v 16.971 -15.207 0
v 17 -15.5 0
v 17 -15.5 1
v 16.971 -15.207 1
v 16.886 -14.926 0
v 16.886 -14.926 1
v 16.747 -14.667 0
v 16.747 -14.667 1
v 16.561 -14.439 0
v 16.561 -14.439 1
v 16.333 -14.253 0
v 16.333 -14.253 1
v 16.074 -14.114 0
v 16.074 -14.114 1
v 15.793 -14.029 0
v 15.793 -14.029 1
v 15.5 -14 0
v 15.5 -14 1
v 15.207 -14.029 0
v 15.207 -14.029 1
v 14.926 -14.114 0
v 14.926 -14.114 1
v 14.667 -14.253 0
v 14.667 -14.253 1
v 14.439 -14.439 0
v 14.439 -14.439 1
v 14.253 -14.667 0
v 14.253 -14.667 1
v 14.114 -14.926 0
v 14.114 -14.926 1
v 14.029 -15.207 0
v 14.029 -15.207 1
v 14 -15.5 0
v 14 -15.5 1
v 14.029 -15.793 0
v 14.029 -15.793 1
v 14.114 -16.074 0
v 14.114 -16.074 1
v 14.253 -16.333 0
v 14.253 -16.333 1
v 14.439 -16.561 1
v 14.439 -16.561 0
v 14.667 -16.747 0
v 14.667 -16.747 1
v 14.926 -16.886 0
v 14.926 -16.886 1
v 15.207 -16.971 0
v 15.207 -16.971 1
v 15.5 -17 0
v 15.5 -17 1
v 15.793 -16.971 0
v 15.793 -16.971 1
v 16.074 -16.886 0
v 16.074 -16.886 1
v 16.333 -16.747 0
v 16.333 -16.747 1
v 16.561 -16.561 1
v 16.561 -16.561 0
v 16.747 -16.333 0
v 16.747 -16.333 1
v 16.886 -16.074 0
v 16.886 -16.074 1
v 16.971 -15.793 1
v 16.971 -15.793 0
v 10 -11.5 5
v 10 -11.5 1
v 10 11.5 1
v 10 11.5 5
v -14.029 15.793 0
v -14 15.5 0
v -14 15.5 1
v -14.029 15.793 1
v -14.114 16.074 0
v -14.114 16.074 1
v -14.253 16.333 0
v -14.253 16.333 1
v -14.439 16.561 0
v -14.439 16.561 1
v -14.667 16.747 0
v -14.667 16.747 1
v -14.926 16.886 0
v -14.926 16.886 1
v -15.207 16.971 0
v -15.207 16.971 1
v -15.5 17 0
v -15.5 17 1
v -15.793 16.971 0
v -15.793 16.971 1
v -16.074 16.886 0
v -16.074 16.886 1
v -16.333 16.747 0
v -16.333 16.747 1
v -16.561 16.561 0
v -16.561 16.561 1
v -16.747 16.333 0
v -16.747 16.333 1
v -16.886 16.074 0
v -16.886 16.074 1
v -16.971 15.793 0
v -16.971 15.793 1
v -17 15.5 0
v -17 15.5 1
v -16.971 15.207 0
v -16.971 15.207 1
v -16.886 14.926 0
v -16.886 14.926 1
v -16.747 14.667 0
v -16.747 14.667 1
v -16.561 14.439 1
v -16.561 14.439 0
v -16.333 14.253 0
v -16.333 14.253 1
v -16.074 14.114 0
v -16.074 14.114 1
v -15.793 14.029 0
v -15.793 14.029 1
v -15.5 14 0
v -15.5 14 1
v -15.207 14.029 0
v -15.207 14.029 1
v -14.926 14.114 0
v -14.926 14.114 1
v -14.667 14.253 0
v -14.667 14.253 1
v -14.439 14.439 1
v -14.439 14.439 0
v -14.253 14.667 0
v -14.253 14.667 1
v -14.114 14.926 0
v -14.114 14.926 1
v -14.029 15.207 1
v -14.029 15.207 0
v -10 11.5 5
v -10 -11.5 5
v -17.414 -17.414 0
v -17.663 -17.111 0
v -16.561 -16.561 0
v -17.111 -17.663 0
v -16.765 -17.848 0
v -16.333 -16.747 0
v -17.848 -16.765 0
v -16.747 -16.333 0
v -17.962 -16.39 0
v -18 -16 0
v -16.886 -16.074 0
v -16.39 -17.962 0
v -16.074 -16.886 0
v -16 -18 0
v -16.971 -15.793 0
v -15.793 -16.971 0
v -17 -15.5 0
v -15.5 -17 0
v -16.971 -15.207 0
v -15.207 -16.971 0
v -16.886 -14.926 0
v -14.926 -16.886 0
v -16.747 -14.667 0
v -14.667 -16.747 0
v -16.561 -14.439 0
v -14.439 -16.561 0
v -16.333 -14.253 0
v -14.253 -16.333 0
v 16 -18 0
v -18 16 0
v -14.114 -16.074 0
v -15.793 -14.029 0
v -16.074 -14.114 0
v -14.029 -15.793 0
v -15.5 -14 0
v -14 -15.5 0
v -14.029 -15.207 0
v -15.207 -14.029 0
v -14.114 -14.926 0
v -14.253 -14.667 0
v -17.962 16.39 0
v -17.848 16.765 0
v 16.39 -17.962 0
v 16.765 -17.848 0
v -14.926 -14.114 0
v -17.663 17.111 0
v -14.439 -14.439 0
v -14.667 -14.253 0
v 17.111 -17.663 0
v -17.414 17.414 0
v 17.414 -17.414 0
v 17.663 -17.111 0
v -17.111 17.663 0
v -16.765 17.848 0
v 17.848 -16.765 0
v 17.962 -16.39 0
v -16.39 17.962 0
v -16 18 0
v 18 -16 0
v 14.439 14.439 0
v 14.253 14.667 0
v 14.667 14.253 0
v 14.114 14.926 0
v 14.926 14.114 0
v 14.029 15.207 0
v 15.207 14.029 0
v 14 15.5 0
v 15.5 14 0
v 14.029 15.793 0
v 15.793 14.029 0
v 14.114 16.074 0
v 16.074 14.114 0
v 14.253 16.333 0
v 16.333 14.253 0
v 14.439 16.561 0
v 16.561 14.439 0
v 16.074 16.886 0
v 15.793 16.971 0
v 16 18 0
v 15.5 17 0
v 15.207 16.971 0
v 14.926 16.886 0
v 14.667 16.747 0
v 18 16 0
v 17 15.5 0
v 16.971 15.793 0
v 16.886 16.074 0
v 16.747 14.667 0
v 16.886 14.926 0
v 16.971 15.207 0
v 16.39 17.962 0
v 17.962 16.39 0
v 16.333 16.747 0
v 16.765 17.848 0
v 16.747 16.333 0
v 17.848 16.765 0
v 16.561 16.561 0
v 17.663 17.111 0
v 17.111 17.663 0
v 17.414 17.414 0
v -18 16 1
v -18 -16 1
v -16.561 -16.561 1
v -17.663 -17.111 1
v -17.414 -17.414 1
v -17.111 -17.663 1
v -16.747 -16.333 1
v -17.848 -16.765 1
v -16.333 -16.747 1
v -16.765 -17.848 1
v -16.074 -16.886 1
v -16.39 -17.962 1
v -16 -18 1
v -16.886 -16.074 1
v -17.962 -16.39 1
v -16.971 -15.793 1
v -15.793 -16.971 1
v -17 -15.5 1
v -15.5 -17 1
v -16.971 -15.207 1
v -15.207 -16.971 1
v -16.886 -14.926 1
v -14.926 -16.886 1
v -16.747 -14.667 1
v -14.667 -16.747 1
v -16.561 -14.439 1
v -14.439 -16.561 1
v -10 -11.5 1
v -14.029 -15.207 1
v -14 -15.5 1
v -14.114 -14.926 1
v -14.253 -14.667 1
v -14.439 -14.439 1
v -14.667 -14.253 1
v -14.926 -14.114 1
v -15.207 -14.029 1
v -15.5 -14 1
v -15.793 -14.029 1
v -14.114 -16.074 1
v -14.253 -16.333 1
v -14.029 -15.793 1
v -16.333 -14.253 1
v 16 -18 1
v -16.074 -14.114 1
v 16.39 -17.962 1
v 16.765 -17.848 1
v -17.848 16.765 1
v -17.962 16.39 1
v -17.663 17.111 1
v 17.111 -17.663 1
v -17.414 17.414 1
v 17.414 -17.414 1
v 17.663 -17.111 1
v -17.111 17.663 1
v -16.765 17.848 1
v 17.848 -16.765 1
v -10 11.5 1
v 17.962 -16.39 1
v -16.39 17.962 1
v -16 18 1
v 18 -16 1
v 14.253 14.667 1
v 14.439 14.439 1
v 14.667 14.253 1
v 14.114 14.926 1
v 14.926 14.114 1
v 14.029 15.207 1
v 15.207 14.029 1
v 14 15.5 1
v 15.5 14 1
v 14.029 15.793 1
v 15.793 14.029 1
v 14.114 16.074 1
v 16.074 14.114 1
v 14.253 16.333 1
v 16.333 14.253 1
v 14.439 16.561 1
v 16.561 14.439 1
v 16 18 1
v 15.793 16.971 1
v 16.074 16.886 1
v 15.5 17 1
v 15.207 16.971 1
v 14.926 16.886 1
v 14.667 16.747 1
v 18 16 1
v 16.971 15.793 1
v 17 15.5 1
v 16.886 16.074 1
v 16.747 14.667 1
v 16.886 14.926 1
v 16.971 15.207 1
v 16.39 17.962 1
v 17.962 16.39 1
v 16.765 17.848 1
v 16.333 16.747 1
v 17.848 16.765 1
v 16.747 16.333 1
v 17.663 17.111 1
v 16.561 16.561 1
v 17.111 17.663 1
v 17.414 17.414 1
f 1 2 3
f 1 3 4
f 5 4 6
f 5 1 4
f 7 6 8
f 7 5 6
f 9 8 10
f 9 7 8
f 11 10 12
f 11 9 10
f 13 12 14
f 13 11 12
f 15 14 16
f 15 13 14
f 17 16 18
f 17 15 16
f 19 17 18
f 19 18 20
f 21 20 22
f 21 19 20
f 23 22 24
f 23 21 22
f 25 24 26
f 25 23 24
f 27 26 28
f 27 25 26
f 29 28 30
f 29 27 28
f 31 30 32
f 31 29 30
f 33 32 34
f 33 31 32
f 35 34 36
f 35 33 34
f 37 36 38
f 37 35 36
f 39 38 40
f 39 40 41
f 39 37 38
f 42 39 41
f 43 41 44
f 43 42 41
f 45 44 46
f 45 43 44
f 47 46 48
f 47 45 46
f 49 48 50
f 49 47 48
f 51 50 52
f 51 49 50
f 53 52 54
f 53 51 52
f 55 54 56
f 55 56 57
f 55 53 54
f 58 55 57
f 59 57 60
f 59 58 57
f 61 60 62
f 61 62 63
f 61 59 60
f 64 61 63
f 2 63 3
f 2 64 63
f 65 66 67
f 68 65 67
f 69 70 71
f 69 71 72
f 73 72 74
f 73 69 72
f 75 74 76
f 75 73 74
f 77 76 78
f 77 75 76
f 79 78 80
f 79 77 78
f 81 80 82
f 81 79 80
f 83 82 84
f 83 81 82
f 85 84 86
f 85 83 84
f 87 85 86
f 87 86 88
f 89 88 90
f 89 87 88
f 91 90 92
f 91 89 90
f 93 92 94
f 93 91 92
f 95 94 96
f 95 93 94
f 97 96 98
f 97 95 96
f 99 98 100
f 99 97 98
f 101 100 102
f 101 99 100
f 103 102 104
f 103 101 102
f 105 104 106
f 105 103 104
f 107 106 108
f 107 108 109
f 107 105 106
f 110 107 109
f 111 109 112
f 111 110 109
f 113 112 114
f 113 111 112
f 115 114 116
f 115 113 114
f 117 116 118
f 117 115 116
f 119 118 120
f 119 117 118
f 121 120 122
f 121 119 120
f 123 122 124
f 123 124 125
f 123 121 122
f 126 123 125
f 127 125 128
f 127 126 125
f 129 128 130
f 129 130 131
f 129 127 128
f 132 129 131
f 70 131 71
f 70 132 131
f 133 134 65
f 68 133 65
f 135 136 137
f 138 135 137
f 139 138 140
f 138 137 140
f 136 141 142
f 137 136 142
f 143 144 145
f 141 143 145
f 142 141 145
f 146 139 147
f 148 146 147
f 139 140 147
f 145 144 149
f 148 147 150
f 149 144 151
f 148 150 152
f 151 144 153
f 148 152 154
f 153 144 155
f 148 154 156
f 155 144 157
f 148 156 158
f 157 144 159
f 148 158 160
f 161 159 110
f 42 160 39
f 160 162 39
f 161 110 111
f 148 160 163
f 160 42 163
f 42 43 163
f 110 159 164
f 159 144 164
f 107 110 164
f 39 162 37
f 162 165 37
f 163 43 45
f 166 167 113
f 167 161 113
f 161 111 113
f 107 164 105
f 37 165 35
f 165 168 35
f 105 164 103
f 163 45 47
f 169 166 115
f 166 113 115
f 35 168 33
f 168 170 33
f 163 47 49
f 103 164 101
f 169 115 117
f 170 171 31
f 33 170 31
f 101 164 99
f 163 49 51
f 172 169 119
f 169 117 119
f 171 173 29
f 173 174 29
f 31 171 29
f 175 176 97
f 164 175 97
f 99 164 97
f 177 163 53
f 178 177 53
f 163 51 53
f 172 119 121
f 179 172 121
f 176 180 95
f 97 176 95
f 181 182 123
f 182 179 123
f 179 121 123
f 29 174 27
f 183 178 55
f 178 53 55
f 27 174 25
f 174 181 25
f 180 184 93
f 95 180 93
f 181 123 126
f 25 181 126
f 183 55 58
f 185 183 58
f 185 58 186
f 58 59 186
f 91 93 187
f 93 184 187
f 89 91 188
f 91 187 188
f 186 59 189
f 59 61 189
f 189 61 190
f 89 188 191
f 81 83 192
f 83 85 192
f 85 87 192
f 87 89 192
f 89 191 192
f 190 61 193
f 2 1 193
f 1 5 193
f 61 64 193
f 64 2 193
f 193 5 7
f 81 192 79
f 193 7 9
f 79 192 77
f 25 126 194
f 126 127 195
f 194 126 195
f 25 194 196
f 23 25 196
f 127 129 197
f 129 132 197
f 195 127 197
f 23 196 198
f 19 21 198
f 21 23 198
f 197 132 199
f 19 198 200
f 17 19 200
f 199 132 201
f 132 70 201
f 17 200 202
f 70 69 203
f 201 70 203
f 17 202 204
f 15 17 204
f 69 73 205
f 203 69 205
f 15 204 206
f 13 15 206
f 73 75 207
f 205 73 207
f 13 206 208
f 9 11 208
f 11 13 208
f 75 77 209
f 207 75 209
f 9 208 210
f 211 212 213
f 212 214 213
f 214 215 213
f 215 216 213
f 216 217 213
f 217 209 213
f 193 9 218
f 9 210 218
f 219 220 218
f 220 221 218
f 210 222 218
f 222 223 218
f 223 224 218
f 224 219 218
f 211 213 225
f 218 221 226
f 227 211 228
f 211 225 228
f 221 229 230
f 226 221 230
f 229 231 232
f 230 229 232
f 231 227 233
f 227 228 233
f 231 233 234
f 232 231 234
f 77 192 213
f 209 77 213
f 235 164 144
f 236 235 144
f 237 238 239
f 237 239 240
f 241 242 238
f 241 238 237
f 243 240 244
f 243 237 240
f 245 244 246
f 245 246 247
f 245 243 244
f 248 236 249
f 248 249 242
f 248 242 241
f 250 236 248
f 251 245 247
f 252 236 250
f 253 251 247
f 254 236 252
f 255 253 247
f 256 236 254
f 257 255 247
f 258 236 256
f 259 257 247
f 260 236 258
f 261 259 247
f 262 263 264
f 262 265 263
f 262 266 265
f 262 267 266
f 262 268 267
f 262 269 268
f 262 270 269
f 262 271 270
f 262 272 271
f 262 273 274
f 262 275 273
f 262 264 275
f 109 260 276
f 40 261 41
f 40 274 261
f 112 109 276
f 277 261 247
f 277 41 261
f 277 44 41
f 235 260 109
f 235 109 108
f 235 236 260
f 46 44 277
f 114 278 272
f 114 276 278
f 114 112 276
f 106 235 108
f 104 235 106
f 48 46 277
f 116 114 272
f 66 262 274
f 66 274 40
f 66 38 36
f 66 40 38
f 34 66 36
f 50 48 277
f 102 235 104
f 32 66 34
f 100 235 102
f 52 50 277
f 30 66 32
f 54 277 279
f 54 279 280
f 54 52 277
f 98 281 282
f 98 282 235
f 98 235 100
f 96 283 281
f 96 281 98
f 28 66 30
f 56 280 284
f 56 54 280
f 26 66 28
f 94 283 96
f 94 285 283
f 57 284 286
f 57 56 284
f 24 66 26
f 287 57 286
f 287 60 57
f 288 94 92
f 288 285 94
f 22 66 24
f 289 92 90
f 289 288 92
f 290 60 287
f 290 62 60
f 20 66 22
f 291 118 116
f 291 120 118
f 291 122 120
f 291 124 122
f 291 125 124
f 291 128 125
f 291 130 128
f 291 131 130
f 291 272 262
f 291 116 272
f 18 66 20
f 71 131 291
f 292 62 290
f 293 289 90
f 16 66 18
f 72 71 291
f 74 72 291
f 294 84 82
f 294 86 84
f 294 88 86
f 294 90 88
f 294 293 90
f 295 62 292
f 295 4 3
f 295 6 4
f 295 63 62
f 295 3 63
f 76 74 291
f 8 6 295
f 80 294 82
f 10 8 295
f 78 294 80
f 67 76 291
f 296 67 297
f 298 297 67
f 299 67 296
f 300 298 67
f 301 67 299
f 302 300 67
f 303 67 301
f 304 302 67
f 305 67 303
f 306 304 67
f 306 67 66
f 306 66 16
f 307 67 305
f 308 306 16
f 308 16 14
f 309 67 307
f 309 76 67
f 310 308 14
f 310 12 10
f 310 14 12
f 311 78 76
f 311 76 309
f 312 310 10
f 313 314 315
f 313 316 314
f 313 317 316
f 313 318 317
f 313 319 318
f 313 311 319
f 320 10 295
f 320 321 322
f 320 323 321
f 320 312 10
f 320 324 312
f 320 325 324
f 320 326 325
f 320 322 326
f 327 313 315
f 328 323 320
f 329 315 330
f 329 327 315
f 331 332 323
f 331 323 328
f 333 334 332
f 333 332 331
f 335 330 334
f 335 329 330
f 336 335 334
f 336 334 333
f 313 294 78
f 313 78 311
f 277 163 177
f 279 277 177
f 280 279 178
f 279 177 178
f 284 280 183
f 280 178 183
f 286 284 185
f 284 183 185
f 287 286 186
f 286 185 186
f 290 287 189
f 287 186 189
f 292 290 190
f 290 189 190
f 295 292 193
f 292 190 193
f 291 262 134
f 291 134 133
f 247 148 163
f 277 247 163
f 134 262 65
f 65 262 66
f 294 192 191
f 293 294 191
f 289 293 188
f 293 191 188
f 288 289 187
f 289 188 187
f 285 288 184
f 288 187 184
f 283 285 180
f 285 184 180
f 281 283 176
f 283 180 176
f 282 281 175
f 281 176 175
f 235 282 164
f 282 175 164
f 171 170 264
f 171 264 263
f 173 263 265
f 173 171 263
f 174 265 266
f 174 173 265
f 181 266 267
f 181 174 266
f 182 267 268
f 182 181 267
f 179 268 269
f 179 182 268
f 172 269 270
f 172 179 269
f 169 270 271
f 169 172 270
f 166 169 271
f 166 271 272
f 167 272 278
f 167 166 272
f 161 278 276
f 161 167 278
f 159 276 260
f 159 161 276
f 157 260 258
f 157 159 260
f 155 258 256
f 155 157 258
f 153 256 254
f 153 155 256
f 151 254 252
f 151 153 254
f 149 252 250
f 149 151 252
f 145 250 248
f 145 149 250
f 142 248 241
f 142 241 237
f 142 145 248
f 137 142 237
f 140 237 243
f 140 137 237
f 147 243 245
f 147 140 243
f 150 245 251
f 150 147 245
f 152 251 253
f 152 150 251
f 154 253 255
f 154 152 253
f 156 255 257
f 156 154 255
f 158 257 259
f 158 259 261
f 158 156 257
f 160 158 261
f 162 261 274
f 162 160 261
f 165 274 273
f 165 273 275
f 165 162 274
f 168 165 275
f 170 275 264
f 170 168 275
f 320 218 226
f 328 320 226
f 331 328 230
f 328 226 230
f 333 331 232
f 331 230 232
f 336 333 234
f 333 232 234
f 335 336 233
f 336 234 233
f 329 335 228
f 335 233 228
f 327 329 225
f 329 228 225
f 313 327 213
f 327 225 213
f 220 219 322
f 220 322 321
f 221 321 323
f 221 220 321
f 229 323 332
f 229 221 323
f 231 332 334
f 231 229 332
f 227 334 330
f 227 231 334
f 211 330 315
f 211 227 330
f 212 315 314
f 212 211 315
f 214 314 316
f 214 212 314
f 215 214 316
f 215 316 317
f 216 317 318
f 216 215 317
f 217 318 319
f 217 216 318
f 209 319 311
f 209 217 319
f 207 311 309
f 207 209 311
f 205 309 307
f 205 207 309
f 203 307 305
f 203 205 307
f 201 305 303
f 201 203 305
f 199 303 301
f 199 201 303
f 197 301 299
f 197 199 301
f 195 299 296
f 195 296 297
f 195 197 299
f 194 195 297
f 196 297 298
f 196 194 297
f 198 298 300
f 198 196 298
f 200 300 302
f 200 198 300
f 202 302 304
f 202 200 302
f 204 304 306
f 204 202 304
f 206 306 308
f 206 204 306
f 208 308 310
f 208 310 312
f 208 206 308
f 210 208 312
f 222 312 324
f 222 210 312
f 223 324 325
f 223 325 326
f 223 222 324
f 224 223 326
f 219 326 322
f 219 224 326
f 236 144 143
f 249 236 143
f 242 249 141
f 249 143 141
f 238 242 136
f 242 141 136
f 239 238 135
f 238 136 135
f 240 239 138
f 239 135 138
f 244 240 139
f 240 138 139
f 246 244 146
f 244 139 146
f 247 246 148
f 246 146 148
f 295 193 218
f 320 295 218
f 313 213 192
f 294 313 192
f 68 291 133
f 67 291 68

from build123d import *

# Parameters (mm, degrees)
F0_R     = 1.5
F1_DEPTH = 1
F2_W     = 20
F2_H     = 23
F3_DEPTH = 4


with BuildPart() as f1:
    # F0 (on Top) → F1 (new body)
    with BuildSketch(Plane.XY):
        with BuildLine():
            Line((16, 18), (-16, 18))
            ThreePointArc((-16, 18), (-17.414214, 17.414214), (-18, 16))
            Line((-18, 16), (-18, -16))
            ThreePointArc((-18, -16), (-17.414214, -17.414214), (-16, -18))
            Line((-16, -18), (16, -18))
            ThreePointArc((16, -18), (17.414214, -17.414214), (18, -16))
            Line((18, -16), (18, 16))
            ThreePointArc((18, 16), (17.414214, 17.414214), (16, 18))
        make_face()
        with Locations((-15.5, -15.5)):
            Circle(F0_R, mode=Mode.SUBTRACT)
        with Locations((15.5, -15.5)):
            Circle(F0_R, mode=Mode.SUBTRACT)
        with Locations((-15.5, 15.5)):
            Circle(F0_R, mode=Mode.SUBTRACT)
        with Locations((15.5, 15.5)):
            Circle(F0_R, mode=Mode.SUBTRACT)
    extrude(amount=F1_DEPTH)

    # F2 (on face) → F3 (join)
    with BuildSketch(Plane.XY.offset(1)):
        Rectangle(F2_W, F2_H)
    extrude(amount=F3_DEPTH)


solid = f1.part
